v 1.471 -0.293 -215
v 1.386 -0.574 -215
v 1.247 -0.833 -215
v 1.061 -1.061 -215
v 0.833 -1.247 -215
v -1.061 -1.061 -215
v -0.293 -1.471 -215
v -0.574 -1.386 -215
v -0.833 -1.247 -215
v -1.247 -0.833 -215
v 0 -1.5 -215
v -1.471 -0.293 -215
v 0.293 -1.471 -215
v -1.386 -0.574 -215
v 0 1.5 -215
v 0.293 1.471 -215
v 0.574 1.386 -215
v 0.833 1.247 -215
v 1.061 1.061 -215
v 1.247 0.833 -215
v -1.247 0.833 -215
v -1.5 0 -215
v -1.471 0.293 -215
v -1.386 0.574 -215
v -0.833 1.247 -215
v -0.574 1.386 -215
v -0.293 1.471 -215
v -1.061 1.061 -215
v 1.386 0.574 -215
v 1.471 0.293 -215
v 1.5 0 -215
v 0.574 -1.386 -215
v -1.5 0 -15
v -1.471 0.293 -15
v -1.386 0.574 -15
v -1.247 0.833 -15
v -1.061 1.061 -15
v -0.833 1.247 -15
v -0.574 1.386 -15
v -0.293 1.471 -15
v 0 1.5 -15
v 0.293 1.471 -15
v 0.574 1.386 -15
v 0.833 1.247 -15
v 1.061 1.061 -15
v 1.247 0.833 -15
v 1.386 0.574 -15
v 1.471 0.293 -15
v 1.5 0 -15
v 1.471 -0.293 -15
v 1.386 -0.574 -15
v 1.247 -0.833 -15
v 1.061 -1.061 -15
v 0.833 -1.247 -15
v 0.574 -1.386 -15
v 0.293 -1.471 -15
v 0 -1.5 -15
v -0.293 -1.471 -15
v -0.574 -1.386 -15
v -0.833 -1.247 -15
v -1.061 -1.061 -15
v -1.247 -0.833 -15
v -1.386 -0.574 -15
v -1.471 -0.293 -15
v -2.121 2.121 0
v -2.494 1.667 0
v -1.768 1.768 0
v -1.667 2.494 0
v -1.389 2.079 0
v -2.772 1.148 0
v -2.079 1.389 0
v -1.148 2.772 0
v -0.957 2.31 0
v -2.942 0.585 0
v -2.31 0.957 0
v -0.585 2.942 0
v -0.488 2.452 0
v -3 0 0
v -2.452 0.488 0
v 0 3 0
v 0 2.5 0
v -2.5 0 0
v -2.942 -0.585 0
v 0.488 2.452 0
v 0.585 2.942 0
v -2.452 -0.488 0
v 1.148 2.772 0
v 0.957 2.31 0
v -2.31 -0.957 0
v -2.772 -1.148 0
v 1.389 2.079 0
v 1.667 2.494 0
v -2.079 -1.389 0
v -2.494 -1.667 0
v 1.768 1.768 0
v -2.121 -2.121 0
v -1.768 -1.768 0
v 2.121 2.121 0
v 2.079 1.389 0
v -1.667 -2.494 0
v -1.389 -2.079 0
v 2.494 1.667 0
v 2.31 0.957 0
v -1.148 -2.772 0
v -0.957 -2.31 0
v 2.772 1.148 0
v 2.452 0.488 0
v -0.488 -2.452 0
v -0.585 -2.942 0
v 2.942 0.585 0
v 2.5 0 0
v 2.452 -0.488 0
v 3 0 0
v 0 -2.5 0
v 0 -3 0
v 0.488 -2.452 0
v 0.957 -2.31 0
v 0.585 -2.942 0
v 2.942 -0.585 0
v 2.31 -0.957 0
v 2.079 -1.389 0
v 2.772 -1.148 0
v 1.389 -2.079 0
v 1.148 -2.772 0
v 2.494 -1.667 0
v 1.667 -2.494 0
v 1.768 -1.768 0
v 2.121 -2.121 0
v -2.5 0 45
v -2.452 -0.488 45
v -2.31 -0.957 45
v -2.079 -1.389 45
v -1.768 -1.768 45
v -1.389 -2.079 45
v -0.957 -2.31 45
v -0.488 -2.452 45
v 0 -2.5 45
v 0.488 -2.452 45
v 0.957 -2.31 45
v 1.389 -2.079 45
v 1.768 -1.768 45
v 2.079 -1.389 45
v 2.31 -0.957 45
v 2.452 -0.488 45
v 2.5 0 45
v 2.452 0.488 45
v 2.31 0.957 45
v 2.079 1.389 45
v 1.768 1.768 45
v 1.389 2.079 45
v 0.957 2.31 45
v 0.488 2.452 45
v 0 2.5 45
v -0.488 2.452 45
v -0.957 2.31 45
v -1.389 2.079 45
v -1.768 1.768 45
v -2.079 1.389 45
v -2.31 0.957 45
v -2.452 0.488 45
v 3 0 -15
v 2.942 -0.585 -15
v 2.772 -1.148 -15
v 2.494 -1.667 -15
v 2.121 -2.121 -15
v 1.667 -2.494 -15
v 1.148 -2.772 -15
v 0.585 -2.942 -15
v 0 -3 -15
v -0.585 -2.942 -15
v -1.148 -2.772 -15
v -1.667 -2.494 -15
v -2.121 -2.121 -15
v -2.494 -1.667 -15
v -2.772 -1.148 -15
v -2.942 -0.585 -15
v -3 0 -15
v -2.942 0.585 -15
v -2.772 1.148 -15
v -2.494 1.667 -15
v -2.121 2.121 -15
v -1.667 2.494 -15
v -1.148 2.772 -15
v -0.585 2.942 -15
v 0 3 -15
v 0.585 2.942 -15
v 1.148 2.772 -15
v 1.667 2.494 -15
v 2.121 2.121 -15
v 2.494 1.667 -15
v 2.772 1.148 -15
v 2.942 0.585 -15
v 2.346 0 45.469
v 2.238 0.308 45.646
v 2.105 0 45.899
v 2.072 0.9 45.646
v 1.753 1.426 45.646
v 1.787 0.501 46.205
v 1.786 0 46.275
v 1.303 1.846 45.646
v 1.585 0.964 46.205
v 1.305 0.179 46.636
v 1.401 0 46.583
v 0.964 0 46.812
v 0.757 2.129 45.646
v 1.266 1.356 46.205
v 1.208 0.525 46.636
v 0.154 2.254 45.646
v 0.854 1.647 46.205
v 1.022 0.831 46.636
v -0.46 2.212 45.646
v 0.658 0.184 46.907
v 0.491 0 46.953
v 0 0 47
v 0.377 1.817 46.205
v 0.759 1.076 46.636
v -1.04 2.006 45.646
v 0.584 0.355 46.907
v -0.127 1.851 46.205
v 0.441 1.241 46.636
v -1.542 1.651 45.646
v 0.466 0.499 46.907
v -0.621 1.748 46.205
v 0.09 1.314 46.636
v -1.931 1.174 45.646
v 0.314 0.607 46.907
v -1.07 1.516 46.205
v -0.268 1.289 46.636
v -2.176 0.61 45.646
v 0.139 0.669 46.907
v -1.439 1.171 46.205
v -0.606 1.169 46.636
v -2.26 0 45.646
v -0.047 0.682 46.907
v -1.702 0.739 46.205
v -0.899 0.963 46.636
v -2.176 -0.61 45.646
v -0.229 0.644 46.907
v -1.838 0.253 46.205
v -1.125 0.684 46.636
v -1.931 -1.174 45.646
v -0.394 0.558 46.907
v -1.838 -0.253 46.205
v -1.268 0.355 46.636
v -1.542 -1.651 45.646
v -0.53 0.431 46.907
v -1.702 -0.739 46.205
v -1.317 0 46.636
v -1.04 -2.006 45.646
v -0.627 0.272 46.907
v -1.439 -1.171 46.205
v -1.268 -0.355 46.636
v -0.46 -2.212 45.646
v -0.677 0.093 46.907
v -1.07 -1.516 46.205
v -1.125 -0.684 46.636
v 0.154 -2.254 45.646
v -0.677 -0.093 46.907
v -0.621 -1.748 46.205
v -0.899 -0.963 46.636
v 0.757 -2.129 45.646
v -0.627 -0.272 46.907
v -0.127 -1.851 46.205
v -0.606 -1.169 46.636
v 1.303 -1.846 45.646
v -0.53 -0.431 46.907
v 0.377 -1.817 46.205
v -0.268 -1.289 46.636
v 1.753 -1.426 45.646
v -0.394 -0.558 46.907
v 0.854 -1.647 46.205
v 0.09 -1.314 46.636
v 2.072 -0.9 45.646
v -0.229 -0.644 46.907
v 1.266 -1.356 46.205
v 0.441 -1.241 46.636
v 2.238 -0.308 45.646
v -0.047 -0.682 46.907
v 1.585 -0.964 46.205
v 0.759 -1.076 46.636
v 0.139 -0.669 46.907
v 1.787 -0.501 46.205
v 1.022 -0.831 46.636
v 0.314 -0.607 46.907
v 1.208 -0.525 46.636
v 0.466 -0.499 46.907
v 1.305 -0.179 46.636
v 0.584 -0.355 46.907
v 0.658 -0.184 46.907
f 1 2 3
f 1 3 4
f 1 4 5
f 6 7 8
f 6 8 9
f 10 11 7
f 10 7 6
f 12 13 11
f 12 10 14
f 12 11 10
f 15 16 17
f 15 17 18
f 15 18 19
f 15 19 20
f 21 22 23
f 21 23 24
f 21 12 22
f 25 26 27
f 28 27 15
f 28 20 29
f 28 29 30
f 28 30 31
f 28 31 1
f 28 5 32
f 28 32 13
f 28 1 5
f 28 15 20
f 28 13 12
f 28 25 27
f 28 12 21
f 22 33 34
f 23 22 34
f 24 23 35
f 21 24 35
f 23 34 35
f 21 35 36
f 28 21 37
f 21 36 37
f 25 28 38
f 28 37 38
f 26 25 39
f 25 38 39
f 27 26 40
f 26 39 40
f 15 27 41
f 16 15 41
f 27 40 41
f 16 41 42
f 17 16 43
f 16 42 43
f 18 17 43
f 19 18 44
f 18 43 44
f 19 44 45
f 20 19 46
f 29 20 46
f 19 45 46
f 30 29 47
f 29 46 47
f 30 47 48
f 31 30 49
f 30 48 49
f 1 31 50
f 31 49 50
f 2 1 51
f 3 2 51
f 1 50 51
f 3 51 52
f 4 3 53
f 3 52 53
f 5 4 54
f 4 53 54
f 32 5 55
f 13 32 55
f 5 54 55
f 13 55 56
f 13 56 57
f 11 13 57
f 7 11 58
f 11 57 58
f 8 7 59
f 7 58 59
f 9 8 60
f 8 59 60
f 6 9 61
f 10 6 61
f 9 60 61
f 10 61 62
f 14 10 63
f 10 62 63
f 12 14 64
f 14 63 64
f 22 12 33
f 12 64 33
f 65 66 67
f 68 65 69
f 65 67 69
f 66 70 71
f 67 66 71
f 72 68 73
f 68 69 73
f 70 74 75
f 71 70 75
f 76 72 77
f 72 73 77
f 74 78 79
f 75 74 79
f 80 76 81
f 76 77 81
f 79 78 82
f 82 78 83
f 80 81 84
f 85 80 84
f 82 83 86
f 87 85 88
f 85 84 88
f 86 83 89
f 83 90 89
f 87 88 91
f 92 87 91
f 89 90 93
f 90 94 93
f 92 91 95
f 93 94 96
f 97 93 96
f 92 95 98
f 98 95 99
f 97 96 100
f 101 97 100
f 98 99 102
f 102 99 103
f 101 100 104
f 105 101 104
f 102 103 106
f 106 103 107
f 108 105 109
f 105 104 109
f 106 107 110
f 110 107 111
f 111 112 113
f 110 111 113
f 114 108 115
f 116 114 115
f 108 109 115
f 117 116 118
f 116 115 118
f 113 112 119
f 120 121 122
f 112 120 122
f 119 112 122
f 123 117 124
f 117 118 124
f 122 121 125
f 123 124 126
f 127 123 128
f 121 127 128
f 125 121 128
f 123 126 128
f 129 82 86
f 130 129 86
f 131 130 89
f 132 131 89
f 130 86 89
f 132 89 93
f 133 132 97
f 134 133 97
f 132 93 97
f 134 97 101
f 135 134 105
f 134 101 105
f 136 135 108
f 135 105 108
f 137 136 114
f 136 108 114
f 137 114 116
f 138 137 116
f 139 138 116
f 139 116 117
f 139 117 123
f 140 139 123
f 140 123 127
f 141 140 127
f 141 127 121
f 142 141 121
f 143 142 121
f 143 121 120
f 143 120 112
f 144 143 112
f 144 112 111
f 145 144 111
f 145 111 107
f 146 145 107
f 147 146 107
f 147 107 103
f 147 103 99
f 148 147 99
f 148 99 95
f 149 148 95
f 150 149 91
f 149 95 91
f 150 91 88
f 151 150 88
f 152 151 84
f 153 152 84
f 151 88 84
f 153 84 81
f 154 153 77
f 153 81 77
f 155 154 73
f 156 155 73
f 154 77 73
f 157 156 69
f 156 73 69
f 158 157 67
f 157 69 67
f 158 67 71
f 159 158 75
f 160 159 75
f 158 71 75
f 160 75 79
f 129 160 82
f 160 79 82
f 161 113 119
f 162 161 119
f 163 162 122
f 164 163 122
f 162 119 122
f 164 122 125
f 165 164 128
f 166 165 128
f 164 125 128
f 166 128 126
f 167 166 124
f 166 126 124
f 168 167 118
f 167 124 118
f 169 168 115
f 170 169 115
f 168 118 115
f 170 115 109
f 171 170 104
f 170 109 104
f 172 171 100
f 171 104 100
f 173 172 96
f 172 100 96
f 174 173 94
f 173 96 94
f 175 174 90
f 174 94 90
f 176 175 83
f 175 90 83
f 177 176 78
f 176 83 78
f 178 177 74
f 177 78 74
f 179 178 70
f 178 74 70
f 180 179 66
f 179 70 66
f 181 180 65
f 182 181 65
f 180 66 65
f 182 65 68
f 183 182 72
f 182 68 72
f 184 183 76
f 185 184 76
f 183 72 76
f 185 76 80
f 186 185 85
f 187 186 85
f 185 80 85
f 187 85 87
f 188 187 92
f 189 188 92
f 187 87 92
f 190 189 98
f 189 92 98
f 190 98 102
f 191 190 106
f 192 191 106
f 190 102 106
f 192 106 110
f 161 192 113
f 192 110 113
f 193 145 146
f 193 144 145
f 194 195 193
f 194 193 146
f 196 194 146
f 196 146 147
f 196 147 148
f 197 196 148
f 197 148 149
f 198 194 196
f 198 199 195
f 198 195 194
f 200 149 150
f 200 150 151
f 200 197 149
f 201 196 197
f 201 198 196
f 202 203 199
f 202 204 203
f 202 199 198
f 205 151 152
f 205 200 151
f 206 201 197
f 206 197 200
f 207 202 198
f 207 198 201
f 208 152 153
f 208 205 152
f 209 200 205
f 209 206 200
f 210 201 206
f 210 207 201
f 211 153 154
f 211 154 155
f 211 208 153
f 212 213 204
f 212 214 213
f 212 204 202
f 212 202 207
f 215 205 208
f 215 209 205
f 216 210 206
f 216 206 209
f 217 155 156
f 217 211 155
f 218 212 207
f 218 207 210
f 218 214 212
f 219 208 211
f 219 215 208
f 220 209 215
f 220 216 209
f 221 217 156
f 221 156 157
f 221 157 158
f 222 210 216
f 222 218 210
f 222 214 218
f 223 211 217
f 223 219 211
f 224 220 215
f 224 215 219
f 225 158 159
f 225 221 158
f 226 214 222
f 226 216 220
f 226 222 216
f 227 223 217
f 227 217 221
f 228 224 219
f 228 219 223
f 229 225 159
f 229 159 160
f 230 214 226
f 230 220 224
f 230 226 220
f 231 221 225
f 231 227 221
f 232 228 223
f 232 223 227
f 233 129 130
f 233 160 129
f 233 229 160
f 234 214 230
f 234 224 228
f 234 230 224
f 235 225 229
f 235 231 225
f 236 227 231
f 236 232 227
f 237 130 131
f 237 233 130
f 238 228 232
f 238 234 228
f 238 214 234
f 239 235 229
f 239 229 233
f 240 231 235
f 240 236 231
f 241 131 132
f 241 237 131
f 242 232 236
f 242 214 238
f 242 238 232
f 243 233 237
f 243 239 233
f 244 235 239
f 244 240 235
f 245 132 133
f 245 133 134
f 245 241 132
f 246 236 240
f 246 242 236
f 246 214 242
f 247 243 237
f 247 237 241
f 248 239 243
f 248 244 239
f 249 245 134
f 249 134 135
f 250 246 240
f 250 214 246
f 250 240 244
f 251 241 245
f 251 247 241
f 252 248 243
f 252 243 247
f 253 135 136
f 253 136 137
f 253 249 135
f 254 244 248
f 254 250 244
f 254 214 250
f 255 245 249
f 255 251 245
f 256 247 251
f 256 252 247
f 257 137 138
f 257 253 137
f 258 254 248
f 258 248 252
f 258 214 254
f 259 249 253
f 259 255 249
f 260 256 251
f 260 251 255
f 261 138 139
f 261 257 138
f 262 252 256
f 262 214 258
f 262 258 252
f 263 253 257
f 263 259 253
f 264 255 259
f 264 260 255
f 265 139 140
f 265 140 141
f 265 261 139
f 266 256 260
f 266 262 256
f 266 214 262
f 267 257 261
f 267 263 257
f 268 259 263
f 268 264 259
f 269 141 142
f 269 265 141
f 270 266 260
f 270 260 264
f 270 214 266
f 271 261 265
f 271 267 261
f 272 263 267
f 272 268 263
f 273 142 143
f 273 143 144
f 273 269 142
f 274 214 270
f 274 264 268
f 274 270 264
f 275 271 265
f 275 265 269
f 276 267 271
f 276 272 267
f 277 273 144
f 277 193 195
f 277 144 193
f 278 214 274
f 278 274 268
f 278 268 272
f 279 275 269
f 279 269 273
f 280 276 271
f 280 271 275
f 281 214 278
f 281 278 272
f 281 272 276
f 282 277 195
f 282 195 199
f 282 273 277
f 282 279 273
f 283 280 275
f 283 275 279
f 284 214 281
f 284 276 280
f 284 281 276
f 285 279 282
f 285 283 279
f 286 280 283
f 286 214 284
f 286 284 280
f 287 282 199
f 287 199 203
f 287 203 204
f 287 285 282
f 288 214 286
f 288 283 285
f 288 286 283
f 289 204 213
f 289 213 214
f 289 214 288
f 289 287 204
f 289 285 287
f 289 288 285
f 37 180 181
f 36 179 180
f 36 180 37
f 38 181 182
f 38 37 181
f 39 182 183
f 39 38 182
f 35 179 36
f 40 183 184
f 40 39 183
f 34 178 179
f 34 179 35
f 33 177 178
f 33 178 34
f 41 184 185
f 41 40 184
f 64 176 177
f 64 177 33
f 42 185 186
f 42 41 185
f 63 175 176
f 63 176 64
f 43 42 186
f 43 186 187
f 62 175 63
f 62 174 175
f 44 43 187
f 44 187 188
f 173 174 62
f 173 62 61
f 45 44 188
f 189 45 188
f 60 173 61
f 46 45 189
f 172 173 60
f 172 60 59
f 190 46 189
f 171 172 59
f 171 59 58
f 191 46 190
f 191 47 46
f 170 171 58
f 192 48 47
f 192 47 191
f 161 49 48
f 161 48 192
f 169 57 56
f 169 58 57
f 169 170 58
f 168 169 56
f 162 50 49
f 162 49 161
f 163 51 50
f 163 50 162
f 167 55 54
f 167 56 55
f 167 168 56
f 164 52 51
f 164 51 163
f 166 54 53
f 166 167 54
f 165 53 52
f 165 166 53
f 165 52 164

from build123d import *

# Parameters (mm, degrees)
ESQUISSE1_R        = 2.5
BOSS_EXTRU_1_DEPTH = 45
D_ME1_FACE_RADIUS  = 2.5
D_ME1_HEIGHT       = 2
ESQUISSE2_R        = 3
BOSS_EXTRU_2_DEPTH = 15
ESQUISSE3_R        = 1.5
BOSS_EXTRU_3_DEPTH = 200


with BuildPart() as part:
    # Esquisse1 → Boss.-Extru.1 (new body)
    with BuildSketch(Plane.XY):
        with Locations(Location((0, 0, 0), (0, 0, 180))):
            Circle(ESQUISSE1_R)
    extrude(amount=BOSS_EXTRU_1_DEPTH)

    # Dôme1: a dome of height H over a round flat face of radius A is a cap of a sphere of radius (A * A + H * H) / (2 * H)
    d_me1_r = (D_ME1_FACE_RADIUS * D_ME1_FACE_RADIUS + D_ME1_HEIGHT * D_ME1_HEIGHT) / (2 * D_ME1_HEIGHT)
    d_me1_base = Plane((0, 0, 45), z_dir=(0, 0, 1))
    with Locations(d_me1_base.offset(D_ME1_HEIGHT - d_me1_r)):
        d_me1_ball = Sphere(d_me1_r, mode=Mode.PRIVATE)
    add(split(d_me1_ball, bisect_by=d_me1_base, keep=Keep.TOP, mode=Mode.PRIVATE))

    # Esquisse2 → Boss.-Extru.2 (add)
    with BuildSketch(Plane(origin=(0, 0, 0), x_dir=(-1, 0, 0), z_dir=(0, 0, -1))):
        with Locations(Location((0, 0, 0), (0, 0, 180))):
            Circle(ESQUISSE2_R)
    extrude(amount=BOSS_EXTRU_2_DEPTH)

    # Esquisse3 → Boss.-Extru.3 (add)
    with BuildSketch(Plane(origin=(0, 0, -15), x_dir=(-1, 0, 0), z_dir=(0, 0, -1))):
        Circle(ESQUISSE3_R)
    extrude(amount=BOSS_EXTRU_3_DEPTH)


solid = part.part
